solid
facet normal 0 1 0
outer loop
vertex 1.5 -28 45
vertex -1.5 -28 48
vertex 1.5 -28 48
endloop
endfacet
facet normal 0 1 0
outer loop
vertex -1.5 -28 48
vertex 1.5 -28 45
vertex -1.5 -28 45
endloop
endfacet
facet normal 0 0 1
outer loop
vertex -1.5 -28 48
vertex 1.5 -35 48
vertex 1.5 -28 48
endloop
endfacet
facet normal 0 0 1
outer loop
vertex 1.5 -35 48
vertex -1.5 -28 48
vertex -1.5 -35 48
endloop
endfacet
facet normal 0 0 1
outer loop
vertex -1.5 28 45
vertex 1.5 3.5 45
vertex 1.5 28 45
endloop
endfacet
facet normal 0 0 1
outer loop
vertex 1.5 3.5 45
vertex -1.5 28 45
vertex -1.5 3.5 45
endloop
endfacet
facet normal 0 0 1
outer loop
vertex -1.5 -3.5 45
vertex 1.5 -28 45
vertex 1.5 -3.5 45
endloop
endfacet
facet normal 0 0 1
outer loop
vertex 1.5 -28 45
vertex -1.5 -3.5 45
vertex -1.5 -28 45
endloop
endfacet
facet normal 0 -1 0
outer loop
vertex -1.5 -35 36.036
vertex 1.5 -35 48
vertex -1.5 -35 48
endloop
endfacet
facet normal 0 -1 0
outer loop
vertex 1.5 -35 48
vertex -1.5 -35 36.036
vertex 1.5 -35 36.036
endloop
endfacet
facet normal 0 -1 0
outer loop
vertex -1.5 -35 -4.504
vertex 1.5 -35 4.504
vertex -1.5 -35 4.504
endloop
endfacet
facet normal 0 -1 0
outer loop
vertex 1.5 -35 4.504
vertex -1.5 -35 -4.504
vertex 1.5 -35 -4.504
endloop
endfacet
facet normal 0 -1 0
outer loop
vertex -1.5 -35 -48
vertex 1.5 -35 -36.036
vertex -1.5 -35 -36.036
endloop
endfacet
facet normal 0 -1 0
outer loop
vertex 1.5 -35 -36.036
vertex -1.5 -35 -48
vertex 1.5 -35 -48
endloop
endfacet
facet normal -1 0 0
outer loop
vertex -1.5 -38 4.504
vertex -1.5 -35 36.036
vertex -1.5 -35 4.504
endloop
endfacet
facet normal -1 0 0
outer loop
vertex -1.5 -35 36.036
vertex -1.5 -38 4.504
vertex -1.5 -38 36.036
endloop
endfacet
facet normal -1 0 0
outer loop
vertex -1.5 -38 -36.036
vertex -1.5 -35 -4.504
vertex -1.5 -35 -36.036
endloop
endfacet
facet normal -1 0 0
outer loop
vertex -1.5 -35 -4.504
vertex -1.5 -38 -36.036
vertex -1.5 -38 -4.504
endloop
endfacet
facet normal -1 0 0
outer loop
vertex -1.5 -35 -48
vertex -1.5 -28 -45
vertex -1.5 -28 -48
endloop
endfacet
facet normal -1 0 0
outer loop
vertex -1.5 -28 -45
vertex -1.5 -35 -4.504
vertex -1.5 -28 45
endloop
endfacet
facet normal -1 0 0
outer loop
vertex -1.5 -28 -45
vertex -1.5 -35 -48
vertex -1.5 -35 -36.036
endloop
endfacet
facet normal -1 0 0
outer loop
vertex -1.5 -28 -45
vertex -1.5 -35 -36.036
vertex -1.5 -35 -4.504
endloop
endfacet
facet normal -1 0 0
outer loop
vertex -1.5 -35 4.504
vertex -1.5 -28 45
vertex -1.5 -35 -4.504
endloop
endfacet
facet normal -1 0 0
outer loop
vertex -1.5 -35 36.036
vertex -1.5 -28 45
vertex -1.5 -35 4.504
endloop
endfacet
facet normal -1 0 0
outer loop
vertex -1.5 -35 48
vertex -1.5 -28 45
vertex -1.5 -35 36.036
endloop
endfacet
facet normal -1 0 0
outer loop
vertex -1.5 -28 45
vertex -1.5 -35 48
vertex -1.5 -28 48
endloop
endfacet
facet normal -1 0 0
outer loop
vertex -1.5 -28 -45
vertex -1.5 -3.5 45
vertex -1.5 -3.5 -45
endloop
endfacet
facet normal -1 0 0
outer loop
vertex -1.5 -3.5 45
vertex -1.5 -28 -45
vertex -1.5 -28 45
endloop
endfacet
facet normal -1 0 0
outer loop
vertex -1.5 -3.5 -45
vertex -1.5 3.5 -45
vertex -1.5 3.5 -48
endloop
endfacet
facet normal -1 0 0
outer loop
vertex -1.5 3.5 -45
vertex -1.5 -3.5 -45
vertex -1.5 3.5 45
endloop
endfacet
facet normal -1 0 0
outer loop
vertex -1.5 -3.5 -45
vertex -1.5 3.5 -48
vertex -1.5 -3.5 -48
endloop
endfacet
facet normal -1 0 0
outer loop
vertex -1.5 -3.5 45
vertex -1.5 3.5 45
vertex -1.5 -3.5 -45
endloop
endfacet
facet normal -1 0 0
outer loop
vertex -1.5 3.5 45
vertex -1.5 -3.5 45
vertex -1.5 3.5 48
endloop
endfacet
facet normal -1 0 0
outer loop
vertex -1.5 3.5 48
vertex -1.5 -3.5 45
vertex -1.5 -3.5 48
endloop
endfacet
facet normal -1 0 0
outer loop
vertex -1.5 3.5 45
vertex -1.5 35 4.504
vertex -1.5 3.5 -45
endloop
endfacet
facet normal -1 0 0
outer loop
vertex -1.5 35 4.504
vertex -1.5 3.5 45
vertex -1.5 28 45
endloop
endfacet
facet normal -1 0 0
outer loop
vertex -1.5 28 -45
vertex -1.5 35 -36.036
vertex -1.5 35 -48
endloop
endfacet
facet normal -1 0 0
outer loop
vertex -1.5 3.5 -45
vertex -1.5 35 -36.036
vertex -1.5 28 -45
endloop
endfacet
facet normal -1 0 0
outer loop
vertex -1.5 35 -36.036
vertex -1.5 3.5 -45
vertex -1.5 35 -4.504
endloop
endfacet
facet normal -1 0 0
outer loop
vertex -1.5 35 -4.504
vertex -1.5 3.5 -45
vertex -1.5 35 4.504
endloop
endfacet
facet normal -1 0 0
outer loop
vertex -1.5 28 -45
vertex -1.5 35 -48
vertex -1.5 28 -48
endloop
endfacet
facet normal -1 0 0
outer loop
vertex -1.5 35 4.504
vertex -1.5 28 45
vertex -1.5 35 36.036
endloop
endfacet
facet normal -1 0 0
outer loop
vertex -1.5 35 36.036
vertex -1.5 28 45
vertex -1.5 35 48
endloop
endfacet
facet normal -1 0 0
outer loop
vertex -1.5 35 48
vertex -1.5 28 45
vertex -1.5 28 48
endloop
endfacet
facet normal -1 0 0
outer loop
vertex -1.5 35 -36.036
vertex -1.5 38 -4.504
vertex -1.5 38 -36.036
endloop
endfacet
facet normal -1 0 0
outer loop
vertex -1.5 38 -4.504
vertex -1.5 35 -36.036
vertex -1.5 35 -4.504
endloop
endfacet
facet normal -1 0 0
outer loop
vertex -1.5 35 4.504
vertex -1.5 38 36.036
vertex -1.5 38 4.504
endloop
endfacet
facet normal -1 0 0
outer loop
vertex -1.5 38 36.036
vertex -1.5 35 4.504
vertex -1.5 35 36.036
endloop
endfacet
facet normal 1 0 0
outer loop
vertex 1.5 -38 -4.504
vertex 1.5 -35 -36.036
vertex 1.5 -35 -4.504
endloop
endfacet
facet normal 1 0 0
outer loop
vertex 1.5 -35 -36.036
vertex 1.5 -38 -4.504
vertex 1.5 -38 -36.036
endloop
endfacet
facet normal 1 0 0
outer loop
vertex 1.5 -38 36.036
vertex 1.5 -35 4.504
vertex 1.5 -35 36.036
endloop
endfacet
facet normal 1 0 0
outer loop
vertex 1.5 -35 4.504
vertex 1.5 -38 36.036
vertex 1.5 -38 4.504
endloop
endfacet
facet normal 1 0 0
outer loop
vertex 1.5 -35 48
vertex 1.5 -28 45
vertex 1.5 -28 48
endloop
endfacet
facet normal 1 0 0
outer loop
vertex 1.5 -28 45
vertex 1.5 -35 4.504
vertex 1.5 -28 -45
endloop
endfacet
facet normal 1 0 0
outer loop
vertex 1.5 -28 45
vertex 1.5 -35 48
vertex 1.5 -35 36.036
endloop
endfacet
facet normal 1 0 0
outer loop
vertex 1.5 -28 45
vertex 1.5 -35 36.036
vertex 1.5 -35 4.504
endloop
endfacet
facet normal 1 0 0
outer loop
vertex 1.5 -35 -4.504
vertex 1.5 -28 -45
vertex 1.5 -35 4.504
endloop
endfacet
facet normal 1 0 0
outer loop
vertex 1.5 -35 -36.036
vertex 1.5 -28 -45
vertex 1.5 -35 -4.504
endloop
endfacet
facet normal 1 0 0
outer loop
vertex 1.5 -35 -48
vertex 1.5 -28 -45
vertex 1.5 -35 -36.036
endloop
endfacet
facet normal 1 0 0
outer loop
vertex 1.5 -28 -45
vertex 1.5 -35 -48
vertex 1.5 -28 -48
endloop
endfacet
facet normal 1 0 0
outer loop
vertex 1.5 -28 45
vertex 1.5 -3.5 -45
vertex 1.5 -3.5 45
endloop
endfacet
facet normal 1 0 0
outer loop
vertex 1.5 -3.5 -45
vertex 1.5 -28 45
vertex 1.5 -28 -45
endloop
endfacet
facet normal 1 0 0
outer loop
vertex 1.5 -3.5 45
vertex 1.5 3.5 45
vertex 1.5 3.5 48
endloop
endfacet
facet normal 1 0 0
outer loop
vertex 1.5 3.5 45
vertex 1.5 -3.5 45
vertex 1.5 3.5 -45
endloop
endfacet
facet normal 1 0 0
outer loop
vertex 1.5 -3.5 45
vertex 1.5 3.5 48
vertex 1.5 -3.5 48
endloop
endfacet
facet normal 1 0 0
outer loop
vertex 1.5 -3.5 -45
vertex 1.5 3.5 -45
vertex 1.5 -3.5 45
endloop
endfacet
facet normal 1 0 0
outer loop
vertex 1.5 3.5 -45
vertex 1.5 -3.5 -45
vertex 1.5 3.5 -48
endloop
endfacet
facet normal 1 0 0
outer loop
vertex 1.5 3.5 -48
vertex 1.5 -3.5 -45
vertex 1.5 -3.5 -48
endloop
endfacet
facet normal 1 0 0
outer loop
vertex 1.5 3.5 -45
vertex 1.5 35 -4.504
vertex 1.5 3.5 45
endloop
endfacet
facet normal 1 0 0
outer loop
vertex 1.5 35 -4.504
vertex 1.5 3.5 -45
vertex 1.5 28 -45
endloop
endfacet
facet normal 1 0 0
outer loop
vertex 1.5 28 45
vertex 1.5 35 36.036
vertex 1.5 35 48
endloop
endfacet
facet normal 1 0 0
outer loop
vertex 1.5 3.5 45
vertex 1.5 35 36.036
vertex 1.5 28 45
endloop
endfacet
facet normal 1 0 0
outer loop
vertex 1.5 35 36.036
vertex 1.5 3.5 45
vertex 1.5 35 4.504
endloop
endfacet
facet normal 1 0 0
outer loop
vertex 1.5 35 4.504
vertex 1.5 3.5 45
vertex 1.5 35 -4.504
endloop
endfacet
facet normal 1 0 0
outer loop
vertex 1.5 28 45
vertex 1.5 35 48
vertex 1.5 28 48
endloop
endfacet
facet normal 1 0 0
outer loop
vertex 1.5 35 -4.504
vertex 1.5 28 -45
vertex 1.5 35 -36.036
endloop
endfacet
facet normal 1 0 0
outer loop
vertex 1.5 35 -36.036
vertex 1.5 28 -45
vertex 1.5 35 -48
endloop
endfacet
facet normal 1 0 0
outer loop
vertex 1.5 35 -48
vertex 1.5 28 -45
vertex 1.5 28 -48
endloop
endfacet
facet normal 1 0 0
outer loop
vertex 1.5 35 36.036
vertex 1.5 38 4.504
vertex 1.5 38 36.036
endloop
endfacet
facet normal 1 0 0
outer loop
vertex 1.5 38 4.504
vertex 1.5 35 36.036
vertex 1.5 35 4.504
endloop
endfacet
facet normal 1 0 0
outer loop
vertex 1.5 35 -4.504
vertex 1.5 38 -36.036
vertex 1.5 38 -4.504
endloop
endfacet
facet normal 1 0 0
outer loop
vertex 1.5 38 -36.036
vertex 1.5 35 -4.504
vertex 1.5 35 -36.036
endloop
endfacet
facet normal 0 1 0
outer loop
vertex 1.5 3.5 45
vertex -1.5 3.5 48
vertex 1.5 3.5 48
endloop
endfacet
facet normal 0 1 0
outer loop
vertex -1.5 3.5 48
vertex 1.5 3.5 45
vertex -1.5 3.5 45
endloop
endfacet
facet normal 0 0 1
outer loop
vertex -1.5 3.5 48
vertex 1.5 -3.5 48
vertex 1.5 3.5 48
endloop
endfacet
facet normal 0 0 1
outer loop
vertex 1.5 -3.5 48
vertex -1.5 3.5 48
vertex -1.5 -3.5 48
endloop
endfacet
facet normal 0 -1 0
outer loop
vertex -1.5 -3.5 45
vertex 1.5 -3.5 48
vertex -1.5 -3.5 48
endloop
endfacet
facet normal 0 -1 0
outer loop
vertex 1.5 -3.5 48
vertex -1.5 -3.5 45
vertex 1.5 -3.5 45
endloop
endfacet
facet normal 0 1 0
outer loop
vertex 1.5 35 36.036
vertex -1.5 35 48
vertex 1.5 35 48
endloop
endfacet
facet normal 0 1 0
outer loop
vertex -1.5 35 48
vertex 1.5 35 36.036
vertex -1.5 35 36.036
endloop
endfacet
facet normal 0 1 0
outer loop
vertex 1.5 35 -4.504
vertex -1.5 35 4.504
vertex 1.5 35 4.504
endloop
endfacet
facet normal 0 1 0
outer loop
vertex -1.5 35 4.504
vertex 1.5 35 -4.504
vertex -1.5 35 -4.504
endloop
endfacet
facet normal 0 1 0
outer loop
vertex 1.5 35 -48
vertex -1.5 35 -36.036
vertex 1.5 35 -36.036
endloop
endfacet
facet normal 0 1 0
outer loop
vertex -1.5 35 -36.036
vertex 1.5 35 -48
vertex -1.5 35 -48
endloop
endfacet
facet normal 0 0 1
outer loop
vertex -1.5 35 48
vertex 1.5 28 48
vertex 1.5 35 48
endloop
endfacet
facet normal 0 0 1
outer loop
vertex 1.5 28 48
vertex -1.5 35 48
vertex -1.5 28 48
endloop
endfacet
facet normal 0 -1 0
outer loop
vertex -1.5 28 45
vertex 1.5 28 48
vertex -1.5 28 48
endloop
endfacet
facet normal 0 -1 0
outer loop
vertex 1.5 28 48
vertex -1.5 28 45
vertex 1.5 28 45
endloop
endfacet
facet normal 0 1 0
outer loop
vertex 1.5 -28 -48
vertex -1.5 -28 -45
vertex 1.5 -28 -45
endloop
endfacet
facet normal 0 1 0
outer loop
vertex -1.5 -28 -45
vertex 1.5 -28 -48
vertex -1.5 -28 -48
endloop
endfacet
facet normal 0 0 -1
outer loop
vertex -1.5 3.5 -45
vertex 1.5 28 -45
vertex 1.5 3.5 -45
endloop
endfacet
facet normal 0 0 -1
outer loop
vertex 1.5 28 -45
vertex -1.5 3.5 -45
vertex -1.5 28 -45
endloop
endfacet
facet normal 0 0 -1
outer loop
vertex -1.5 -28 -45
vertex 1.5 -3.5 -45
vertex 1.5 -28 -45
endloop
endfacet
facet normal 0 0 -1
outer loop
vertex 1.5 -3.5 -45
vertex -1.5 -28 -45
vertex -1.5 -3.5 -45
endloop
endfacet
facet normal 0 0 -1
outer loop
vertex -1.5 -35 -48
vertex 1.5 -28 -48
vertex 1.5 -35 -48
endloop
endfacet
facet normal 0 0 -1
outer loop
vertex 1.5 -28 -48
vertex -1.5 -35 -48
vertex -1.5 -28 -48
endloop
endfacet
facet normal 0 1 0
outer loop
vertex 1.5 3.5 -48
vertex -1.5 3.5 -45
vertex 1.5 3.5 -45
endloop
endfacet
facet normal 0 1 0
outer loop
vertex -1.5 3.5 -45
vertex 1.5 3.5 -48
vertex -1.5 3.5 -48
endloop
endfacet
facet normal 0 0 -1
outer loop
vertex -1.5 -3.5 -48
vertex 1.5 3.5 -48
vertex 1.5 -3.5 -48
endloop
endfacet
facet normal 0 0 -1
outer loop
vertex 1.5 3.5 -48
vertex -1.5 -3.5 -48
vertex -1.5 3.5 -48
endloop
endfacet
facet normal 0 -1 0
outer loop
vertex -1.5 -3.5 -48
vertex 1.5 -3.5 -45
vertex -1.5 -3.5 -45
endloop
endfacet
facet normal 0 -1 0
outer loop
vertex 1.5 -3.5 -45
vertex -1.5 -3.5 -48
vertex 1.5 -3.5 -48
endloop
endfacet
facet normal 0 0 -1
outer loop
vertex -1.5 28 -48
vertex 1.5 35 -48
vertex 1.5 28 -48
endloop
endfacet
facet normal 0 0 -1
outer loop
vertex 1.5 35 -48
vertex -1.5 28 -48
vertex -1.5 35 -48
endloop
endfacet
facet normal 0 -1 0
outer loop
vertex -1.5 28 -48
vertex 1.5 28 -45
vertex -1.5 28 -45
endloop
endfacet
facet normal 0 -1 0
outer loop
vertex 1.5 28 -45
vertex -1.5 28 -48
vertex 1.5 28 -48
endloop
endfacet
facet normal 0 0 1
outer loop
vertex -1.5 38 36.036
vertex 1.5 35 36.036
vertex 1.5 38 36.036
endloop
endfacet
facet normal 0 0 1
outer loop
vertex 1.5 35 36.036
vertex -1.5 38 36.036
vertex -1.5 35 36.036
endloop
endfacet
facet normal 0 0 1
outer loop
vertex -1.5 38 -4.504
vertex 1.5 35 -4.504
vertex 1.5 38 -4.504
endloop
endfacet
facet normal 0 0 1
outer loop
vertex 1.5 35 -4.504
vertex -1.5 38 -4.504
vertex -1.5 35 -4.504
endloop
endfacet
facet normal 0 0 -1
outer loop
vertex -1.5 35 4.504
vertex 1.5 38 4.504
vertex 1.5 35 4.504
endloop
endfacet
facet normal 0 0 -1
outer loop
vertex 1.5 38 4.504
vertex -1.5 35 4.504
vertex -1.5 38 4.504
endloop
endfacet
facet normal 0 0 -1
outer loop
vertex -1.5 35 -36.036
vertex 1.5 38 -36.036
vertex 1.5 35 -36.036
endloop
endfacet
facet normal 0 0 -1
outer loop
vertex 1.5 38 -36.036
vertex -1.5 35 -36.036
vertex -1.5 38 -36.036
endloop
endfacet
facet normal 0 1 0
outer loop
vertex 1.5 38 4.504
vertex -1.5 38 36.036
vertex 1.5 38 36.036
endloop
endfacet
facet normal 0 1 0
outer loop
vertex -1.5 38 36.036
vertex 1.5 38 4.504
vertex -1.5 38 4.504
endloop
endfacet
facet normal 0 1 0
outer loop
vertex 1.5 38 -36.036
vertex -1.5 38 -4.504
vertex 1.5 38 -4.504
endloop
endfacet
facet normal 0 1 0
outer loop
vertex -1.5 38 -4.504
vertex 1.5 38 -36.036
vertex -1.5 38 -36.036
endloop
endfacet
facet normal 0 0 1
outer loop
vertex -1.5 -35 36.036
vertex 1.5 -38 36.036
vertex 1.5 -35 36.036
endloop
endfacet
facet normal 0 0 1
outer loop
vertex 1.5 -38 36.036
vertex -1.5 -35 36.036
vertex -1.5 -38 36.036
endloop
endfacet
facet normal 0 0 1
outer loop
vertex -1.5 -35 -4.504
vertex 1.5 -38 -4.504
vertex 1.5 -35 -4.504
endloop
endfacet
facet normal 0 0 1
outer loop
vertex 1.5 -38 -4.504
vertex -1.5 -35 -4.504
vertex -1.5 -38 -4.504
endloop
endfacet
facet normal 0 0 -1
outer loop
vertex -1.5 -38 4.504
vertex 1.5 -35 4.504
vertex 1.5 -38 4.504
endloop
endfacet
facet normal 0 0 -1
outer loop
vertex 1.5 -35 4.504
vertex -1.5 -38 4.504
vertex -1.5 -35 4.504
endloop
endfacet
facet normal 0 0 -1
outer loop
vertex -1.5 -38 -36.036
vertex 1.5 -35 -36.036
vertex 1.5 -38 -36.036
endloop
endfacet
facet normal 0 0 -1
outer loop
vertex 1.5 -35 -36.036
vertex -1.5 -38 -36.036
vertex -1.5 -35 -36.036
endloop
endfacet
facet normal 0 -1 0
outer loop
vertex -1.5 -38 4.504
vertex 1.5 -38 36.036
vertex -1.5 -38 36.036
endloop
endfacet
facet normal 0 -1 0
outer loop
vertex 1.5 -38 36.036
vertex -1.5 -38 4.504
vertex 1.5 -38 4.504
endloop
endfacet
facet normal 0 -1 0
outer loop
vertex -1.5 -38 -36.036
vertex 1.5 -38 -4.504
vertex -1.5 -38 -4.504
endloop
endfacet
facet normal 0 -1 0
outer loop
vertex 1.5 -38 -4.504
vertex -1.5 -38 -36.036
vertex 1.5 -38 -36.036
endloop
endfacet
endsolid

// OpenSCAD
// file: noses.scad
include <config.scad>;

/**
 * Generates configured number of noses
 * centered, along X axis, to normalized total length of 1
 */
module nose_positive()
{
    begin_x = -0.5;
    delta_x = (1-relative_nose_length) / (nose_count-1);
    for (i=[0:nose_count-1])
    {
        translate([
            begin_x + i*delta_x,
            -material_z/2,
            -material_z/2
            ])
        cube([
            relative_nose_length,
            material_z,
            material_z
            ]);
    }
}

/**
 * Generates the counterpart to nose_positive()
 */
module nose_negative()
{
    // subtract nose_positive() from centered cuboid
    difference()
    {
        translate([
            -0.5,
            -material_z/2,
            -material_z/2
            ])
        cube([
            1,
            material_z,
            material_z
            ]);
        // a little overscale to get rid of rendering artifacts
        scale([
            1.001,
            1.001,
            1.001
            ])
        nose_positive();
    }
}

nose_negative();
// file: config.scad
// all measures in mm

/*
 * Base material to cut from
 */
material_x = 510;
material_y = 370;
material_z = 3;

/*
 * Shark model measures
 */
shark_length = 100;

/*
 * Cuboid measures (inside)
 */
cuboid_x = shark_length / 2;
cuboid_y = cuboid_x+20;
cuboid_z = cuboid_x+40;

/*
 * Save some calculations
 */
cuboid_x_2 = cuboid_x / 2;
cuboid_y_2 = cuboid_y / 2;
cuboid_z_2 = cuboid_z / 2;
material_z_2 = material_z / 2;

/*
 * Nose properties
 */
// the number
nose_count = 3;
// width of a nose relative to length of the corresponding edge
relative_nose_length = 0.1;

/*
 * Rendering and projection properties
 */
// how far apart from on another to project the parts
projection_spacing = 1;
// rendering quality (face number)
$fn = 50;
// main file
include <config.scad>;
use <noses.scad>;

/**
 * Generate the top and bottom face of the cuboid
 * with noses, centered around origin
 */
module face_yz()
{
    color("red")
    {
        cube([
            material_z,
            cuboid_y,
            cuboid_z,
            ], center=true);

        rotate([
            0,
            0,
            90
            ])
        scale([
            cuboid_y,
            1,
            1
            ])
        {
            translate([
                0,
                0,
                cuboid_z_2 + material_z_2
                ])
            nose_positive();

            translate([
                0,
                0,
                - cuboid_z_2 - material_z_2
                ])
            nose_positive();
        }

        rotate([
            0,
            90,
            0
            ])
        scale([
            cuboid_z,
            1,
            1
            ])
        {
            translate([
                0,
                cuboid_y_2 + material_z_2,
                0
                ])
            nose_negative();

            translate([
                0,
                - cuboid_y_2 - material_z_2,
                0
                ])
            nose_negative();
        }
    }
}

face_yz();
